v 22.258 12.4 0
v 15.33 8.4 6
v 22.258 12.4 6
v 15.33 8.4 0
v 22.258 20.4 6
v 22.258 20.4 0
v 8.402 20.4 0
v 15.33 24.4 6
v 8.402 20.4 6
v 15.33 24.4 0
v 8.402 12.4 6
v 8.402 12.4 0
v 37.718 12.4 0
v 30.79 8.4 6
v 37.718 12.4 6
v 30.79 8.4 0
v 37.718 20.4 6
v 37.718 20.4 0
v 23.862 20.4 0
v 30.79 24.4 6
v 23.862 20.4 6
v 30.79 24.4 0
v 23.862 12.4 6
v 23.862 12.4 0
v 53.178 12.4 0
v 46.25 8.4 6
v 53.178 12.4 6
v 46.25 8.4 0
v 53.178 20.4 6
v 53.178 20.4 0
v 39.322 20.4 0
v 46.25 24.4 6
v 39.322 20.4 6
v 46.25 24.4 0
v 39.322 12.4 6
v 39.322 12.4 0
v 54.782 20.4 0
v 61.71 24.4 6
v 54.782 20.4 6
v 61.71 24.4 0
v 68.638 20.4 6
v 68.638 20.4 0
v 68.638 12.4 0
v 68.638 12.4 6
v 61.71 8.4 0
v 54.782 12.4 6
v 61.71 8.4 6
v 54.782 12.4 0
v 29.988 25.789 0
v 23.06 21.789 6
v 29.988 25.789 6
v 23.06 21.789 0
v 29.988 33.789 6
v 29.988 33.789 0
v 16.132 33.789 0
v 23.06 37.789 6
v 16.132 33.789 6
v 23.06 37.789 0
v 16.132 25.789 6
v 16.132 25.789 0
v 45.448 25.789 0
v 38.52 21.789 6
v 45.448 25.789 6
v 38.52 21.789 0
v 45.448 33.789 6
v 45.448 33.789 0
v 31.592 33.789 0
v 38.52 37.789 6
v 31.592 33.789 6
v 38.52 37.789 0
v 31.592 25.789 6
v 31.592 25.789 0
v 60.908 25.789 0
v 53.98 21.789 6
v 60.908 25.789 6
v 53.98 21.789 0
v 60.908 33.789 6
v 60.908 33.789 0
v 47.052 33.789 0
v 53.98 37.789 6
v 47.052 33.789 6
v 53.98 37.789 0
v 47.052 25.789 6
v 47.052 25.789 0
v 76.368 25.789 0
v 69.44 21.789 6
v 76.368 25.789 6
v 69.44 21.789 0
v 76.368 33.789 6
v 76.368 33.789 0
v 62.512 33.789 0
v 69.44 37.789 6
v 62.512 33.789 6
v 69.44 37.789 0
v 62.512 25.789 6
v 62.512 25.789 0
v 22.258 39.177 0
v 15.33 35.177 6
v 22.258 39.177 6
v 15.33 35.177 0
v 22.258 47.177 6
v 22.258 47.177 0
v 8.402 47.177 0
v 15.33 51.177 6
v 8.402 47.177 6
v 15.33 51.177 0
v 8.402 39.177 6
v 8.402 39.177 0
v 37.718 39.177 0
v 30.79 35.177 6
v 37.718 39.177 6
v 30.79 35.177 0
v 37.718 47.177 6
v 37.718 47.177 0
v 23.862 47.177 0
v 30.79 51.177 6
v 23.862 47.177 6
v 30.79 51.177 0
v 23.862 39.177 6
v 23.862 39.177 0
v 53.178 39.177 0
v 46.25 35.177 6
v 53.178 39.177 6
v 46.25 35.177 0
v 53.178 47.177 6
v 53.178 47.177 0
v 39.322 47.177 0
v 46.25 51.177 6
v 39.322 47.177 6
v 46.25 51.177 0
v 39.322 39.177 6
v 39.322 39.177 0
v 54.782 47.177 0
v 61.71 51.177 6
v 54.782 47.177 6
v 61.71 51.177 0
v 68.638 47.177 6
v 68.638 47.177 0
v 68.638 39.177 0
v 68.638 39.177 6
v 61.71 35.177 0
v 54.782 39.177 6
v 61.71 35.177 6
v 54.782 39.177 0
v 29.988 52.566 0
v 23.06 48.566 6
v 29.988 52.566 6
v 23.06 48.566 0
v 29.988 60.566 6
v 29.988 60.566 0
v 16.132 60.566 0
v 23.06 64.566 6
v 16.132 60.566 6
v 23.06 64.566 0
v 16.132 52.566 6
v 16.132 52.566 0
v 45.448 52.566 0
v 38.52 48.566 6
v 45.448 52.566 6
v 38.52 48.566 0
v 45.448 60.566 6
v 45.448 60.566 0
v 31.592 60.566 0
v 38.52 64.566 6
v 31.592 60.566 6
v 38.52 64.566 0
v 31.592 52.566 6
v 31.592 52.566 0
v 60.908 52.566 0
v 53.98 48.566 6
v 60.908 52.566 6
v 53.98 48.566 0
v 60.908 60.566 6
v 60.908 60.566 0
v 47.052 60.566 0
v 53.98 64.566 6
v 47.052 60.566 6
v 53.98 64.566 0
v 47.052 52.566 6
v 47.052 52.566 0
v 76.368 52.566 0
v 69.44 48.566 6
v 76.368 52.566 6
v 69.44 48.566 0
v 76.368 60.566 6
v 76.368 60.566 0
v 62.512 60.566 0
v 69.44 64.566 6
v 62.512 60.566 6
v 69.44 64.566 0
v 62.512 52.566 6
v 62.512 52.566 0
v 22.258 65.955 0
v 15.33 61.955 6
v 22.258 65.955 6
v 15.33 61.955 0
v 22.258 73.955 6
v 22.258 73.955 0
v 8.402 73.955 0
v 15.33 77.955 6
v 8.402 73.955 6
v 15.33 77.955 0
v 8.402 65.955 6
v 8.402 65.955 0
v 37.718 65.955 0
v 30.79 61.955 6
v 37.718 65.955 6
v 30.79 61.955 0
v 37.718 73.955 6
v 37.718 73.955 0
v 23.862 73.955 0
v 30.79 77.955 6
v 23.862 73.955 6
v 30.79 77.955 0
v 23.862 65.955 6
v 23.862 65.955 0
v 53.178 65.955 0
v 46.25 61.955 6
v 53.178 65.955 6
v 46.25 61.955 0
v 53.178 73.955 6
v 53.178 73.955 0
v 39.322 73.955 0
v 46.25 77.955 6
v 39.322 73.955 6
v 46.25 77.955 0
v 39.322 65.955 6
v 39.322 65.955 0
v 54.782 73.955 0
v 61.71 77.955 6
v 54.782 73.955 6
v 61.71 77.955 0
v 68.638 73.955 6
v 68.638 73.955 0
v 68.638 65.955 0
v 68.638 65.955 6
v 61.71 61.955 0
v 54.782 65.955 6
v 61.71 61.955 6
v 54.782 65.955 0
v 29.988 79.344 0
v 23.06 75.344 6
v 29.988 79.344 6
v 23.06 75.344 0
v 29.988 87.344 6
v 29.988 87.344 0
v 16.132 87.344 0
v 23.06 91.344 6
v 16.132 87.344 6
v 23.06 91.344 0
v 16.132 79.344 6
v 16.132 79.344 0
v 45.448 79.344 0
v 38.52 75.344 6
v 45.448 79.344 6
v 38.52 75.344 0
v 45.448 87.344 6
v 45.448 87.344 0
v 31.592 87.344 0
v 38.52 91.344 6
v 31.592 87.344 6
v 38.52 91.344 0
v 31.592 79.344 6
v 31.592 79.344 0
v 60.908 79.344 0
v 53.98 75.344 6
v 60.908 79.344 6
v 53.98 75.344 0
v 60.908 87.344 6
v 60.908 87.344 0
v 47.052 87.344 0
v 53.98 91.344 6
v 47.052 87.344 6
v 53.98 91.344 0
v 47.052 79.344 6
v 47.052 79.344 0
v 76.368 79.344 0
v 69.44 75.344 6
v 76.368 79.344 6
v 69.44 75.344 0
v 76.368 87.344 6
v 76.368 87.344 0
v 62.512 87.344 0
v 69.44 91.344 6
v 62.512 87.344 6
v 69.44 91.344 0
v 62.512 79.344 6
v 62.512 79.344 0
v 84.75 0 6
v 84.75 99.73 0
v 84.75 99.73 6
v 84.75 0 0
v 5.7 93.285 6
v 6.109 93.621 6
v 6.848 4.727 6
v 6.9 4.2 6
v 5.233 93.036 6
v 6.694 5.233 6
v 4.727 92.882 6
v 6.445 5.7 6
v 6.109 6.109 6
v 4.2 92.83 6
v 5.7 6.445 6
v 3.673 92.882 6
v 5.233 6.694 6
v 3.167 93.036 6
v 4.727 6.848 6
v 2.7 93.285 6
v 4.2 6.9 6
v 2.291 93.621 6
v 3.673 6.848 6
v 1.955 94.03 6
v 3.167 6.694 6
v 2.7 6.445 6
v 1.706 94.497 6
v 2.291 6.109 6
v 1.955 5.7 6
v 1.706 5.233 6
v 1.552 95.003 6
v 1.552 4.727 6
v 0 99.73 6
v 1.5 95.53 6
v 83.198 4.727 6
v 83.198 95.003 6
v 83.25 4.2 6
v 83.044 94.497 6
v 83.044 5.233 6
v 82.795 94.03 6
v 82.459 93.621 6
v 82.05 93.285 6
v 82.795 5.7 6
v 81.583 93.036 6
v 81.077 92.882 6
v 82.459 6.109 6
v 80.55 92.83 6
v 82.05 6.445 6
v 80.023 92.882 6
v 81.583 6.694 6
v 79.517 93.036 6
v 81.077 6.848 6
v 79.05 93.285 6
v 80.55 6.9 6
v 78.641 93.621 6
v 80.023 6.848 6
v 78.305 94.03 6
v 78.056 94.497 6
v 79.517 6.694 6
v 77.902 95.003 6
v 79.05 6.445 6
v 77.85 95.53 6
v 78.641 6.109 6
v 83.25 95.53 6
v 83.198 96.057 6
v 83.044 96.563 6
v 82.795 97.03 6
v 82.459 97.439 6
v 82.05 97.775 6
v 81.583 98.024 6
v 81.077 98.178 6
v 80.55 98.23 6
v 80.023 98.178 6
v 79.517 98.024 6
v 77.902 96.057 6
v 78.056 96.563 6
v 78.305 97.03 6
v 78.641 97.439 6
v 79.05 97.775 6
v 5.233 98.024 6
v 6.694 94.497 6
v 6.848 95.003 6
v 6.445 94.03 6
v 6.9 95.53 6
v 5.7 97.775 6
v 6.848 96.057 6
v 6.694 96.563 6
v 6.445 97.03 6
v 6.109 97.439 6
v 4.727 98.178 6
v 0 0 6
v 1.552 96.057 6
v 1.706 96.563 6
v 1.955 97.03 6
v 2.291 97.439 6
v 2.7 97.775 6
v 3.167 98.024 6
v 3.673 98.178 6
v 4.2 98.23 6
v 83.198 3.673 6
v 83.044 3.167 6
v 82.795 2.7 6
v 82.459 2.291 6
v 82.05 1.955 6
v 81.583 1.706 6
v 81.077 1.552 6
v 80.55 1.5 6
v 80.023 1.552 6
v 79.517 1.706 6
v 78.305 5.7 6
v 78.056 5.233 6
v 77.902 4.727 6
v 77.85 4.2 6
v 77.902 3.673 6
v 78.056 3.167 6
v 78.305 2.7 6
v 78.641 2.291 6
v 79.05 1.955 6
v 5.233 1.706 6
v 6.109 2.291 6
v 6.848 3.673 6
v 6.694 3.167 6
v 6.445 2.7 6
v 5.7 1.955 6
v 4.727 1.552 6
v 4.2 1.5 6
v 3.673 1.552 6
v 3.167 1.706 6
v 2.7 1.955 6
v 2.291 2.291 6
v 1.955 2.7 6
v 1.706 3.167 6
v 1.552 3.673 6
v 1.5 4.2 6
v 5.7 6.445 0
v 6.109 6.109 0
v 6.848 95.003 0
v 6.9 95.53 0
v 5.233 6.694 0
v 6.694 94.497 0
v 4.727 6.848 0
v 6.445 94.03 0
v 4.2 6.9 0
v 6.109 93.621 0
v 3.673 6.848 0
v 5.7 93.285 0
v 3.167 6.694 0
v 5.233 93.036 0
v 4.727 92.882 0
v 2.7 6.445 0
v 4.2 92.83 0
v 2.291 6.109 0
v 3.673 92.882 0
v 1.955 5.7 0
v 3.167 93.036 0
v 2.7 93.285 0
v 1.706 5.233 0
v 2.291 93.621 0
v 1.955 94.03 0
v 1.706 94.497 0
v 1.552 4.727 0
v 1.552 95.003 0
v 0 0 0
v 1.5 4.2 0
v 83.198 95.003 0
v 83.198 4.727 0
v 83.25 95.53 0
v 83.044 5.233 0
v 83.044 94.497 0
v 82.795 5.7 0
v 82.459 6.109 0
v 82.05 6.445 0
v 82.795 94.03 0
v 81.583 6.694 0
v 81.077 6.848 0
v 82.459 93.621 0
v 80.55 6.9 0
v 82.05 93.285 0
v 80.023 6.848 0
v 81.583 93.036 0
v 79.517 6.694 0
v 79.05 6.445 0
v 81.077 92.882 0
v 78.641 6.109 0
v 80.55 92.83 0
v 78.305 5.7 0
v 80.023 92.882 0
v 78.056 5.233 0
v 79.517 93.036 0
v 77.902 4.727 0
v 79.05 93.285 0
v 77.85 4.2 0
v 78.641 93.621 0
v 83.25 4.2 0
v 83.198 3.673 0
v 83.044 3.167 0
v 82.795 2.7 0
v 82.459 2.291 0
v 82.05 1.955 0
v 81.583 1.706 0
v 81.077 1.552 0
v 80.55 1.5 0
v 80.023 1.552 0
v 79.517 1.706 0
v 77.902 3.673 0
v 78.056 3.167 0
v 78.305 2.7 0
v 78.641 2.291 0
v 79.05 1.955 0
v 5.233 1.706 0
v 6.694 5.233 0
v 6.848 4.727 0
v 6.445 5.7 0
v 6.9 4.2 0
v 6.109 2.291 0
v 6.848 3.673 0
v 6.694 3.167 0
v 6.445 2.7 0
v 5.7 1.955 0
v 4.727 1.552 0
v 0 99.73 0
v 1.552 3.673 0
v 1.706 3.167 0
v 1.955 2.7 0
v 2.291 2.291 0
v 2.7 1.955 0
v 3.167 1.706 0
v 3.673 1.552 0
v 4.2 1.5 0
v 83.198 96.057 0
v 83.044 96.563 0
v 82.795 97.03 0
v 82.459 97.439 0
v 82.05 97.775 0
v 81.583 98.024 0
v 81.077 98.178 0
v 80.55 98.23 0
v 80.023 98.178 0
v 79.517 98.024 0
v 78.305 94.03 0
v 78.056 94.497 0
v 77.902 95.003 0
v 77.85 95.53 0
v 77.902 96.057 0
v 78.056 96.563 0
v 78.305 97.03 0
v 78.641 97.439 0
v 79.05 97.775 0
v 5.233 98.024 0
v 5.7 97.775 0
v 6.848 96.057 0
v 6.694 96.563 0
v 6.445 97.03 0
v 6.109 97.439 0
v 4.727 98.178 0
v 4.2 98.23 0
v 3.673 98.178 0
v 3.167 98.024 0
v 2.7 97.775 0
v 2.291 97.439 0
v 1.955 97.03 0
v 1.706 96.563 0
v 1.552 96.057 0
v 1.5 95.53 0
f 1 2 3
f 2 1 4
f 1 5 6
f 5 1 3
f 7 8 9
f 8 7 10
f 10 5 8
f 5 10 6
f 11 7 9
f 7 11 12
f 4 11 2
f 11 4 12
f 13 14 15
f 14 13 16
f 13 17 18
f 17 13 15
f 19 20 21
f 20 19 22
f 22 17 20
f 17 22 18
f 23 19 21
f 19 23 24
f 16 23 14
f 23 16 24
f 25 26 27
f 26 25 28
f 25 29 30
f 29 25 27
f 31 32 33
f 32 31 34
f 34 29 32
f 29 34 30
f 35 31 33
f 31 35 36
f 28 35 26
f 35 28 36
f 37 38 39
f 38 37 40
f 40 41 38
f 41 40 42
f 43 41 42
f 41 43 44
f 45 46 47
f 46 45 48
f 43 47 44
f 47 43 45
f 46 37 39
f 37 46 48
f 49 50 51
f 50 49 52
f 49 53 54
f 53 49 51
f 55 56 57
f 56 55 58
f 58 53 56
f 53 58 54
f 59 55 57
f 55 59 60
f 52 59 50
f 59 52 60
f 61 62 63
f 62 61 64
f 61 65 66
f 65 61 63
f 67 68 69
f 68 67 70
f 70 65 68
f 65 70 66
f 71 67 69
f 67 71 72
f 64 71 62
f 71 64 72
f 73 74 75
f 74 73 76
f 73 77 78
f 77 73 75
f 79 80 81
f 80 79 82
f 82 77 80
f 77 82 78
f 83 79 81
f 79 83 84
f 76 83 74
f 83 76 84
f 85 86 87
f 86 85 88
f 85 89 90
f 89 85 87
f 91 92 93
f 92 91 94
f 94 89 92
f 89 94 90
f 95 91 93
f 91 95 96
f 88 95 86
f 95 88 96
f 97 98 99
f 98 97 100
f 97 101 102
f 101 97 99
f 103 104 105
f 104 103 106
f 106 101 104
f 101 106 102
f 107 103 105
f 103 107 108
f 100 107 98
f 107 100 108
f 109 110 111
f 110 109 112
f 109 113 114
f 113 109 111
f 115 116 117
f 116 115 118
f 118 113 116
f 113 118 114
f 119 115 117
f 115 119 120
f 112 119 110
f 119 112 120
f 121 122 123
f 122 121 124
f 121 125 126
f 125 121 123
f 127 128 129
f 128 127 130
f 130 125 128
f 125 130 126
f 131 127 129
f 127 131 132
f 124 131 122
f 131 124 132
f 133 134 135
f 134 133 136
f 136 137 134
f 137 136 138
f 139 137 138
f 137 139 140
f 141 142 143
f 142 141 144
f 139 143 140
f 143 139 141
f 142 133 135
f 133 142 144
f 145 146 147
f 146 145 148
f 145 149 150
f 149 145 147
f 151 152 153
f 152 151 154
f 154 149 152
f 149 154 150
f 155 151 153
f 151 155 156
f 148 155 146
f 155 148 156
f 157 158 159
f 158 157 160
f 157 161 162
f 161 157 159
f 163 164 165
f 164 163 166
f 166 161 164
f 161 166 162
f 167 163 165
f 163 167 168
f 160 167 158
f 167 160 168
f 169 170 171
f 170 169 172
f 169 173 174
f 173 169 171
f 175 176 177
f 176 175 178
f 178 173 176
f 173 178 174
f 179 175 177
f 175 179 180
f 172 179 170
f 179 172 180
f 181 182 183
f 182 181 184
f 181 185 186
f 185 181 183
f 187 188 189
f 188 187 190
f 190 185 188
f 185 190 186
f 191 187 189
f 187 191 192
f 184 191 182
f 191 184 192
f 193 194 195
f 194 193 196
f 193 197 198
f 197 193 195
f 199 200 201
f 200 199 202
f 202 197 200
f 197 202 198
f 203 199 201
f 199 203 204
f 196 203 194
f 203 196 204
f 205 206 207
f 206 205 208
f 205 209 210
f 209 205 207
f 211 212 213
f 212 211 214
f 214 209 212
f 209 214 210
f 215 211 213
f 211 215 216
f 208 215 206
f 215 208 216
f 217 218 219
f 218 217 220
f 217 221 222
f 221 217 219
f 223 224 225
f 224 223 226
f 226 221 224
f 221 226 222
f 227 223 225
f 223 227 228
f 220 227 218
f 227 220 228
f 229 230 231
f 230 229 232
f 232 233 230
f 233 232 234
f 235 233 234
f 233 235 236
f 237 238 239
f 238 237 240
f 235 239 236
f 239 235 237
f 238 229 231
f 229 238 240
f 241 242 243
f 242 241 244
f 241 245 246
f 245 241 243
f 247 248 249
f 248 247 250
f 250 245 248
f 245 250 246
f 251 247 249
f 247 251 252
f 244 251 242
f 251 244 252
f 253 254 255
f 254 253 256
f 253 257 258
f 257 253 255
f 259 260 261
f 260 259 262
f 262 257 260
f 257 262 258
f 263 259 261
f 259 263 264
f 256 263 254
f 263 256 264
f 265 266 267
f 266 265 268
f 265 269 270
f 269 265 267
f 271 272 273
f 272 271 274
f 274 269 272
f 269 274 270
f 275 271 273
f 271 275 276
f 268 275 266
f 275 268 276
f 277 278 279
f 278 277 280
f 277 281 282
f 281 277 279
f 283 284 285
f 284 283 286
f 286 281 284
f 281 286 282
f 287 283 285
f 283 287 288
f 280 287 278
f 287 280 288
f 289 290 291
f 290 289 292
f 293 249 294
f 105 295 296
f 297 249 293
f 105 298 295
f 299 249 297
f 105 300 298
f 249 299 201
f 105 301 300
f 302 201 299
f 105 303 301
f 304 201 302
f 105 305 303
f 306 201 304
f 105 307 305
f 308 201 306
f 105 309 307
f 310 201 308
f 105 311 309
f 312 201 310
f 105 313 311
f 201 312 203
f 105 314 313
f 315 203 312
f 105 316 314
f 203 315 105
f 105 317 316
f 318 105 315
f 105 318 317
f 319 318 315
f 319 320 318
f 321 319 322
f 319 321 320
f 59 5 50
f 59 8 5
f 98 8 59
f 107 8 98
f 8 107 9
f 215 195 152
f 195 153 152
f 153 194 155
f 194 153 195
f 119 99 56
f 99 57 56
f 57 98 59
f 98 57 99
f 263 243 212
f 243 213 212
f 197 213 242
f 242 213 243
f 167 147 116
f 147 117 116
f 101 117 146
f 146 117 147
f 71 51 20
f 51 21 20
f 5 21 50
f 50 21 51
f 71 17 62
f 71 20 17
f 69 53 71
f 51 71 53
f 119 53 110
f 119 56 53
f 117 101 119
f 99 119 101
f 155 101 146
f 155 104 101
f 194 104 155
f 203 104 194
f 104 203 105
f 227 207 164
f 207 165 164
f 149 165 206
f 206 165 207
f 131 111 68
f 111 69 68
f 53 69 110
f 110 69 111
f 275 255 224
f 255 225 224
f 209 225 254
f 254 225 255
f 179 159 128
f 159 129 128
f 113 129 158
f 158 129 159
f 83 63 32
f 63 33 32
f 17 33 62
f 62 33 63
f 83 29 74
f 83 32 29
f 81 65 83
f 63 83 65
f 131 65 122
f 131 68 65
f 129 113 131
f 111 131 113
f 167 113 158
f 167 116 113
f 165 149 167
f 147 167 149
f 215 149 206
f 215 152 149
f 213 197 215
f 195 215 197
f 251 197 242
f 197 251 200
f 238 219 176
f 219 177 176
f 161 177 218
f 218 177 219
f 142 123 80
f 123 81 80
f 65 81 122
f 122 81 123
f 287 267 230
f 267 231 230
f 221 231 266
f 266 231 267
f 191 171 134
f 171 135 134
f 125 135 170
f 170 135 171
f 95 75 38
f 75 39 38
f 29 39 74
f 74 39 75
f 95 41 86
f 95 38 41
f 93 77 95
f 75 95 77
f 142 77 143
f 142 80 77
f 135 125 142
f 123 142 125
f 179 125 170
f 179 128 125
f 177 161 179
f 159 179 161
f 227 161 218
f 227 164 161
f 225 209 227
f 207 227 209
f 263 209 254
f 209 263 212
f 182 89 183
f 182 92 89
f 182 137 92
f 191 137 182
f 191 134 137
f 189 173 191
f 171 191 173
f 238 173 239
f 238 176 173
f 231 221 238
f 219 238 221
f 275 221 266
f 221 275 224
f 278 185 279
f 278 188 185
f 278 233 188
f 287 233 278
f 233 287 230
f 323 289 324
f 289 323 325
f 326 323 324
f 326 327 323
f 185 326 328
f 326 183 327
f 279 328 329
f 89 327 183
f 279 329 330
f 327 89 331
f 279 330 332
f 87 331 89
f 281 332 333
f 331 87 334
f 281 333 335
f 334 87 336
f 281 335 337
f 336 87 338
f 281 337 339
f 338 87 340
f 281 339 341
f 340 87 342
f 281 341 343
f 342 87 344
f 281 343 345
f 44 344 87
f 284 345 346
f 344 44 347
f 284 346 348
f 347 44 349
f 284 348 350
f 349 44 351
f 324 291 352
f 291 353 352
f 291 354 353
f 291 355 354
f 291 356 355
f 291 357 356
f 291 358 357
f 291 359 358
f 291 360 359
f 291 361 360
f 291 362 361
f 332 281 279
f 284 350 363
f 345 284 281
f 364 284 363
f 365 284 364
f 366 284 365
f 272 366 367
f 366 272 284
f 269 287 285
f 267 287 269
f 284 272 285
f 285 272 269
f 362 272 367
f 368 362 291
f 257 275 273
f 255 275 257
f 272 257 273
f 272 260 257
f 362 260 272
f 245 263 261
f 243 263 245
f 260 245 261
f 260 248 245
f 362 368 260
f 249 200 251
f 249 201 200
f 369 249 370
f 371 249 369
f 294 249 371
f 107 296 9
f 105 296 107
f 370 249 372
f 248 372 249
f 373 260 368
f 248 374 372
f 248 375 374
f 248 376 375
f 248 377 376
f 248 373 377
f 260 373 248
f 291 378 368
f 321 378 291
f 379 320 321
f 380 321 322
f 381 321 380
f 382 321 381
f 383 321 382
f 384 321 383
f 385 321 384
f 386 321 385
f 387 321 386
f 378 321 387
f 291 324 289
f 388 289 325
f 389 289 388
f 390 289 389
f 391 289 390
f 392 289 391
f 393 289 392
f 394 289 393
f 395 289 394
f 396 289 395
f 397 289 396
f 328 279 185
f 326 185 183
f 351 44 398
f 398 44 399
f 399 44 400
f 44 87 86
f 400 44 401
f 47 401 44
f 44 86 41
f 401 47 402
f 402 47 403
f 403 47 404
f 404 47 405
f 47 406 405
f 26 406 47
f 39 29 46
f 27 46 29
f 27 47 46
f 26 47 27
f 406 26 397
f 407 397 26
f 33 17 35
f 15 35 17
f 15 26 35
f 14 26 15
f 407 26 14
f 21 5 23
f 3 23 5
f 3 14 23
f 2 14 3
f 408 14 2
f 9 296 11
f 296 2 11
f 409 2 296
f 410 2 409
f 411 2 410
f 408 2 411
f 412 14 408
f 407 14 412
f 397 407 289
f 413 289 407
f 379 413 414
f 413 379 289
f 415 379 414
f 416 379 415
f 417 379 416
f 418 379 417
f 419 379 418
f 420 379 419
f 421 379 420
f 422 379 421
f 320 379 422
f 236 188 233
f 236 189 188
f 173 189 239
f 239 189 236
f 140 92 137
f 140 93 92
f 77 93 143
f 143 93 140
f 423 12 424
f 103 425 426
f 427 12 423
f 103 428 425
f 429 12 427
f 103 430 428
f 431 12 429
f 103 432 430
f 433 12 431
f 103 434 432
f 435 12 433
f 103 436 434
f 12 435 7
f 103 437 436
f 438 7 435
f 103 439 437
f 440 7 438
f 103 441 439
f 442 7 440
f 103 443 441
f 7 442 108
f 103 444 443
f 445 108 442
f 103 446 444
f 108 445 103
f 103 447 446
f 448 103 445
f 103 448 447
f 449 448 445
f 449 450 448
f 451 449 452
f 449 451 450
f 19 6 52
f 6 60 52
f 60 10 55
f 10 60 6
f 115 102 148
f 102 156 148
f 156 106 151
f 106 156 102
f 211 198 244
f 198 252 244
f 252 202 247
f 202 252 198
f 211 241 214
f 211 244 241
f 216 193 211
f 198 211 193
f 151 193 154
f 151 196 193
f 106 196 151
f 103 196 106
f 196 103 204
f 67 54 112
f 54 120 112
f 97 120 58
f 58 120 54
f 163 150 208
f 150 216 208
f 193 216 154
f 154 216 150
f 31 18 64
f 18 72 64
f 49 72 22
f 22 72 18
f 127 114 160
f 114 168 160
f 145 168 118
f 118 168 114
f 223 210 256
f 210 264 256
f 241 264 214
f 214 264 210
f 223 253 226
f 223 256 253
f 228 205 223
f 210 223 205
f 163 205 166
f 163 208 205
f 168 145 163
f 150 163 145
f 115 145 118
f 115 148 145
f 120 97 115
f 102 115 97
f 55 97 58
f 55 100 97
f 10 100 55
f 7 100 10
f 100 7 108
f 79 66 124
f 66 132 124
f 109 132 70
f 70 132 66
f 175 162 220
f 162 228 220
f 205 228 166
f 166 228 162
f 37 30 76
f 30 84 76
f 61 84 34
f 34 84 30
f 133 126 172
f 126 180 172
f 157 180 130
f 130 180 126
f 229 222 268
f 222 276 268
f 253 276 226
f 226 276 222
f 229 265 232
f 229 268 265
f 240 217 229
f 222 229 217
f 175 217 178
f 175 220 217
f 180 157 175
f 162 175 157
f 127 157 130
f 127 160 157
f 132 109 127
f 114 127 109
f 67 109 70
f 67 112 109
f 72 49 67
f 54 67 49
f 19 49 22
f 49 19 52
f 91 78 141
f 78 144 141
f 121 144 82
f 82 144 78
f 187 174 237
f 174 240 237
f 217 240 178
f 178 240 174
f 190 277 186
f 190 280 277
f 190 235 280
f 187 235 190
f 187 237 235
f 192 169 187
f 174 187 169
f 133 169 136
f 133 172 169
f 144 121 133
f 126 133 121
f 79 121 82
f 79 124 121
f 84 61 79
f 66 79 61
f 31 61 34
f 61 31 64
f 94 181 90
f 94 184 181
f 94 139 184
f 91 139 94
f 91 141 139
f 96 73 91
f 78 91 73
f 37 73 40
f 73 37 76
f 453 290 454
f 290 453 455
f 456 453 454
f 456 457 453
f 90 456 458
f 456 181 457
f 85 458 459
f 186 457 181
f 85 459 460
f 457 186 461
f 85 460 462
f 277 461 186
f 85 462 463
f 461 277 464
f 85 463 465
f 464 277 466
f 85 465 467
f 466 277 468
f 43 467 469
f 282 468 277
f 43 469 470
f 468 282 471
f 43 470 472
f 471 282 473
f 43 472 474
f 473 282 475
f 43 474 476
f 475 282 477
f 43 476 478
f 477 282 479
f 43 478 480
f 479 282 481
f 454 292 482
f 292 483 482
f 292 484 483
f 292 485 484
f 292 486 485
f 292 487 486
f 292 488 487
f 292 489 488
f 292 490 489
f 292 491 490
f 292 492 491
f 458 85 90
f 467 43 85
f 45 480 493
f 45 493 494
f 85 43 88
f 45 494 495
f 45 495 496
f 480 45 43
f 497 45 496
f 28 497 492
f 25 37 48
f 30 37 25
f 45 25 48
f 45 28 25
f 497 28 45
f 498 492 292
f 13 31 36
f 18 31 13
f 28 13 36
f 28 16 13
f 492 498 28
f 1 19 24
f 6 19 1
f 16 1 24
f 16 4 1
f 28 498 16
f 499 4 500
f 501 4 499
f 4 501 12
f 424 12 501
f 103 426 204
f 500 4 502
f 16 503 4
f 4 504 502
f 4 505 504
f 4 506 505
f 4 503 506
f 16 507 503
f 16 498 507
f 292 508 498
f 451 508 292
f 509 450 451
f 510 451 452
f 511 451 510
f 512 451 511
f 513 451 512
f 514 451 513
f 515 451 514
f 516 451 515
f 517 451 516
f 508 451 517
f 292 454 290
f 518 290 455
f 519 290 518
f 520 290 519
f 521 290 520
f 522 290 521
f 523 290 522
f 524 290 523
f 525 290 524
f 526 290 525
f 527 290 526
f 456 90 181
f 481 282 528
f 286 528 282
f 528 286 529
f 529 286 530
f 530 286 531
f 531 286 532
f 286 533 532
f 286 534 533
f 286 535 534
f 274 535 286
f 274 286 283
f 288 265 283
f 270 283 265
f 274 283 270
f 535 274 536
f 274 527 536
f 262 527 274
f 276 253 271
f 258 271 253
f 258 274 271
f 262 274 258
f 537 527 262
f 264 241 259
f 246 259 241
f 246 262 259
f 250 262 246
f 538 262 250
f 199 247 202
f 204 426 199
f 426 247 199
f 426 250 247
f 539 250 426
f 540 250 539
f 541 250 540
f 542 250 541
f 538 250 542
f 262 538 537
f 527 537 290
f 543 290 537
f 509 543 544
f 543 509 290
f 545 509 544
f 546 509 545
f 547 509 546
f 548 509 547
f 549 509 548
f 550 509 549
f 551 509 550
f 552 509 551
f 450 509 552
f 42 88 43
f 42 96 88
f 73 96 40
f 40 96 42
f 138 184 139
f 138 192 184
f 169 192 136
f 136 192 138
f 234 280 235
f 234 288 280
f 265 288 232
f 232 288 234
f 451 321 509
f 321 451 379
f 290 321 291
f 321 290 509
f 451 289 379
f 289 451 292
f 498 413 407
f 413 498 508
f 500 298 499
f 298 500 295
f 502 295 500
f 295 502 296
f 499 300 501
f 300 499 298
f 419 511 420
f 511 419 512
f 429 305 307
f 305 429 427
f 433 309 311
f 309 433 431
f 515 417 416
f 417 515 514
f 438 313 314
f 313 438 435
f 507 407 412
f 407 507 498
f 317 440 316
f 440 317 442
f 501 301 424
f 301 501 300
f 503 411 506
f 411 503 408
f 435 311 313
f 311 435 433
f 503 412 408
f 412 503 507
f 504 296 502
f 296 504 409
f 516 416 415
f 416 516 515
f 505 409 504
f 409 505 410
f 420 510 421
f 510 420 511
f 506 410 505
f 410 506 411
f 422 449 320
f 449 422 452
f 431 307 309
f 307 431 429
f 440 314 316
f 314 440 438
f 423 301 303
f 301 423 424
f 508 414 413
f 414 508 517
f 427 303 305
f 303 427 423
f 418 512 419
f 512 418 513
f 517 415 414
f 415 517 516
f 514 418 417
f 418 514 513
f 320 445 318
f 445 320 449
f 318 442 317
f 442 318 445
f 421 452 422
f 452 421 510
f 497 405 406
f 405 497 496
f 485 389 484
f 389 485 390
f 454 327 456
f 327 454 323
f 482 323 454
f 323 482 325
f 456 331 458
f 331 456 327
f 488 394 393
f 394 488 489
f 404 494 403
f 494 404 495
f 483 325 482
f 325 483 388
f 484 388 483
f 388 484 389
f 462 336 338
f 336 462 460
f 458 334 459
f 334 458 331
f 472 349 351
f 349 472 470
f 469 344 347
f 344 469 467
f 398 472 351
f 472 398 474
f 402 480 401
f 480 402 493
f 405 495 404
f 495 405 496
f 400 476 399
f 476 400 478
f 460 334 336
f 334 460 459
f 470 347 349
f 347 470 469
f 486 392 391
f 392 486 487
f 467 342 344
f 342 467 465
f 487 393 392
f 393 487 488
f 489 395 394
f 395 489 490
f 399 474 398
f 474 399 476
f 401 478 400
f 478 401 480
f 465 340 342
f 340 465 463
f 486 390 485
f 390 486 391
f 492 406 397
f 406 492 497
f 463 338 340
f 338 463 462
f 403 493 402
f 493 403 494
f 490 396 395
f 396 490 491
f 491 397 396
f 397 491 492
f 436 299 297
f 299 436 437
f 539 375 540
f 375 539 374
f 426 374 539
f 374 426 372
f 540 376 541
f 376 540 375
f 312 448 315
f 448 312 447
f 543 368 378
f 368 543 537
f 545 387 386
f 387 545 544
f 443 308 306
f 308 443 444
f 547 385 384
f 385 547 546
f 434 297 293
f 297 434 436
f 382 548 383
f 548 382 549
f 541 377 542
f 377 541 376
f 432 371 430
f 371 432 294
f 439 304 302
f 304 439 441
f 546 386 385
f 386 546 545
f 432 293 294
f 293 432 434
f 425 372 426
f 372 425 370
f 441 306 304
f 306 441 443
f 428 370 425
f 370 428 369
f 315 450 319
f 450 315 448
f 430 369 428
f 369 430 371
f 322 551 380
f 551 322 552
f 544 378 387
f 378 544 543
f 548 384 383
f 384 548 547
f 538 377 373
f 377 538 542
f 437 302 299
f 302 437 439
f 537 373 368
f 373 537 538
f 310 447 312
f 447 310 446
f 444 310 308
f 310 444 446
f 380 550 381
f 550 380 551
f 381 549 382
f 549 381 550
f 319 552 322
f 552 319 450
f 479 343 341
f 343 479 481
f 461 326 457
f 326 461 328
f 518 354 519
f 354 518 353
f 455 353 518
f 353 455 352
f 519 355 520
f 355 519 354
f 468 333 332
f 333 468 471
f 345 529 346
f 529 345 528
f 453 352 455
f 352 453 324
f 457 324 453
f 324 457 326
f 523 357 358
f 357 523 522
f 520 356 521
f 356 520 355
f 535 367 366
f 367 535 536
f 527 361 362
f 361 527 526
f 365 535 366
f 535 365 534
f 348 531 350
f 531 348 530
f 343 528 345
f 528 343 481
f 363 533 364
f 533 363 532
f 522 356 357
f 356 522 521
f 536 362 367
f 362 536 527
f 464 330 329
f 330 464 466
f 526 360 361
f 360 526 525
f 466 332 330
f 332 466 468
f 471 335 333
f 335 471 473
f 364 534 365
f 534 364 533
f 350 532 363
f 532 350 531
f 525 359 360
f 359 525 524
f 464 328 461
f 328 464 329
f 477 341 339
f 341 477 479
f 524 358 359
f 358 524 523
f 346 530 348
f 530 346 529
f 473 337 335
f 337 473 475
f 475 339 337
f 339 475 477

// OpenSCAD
$fn = 32;

// ----------------------------------------------------------------------
// Honeycomb panel: 84.75 x 99.73 mm, 24 cells of 16 mm
// ----------------------------------------------------------------------

// --- parameters (mm) ---
panel_w = 84.75;          // panel width
panel_d = 99.73;          // panel depth
thick = 6;                // panel thickness
cell_r = 8;               // hex cell circumradius
pitch = 15.46;            // hex cell pitch (centre to centre)
web = 1.6;                // web between the cells
columns = 4;              // columns of cells
rows = 6;                 // rows of cells
cell_count = 24;          // total cells
shift_x = 15.33;          // first cell offset in x
shift_y = 16.4;           // first cell offset in y
mount_d = 5.4;            // corner mounting holes
hole_off = 4.2;           // mounting hole offset from the corners

difference() {
  union() {
    cube([panel_w, panel_d, thick]);
  }
  /* hexagonal cells, point-up, cut right through the plate */
  for (row = [0 : rows - 1]) {
    for (col = [0 : columns - 1]) {
      translate([shift_x + col * pitch + (row % 2) * pitch / 2, shift_y + row * pitch * 0.866025, -2.5]) rotate([0, 0, 30]) cylinder(h = thick + 5, d = 2 * cell_r, $fn = 6);
    }
  }
  /* corner mounting holes, clear of the outer cell web */
  translate([4.2, 4.2, -2.5]) cylinder(h = thick + 5, d = mount_d);
  translate([80.55, 4.2, -2.5]) cylinder(h = thick + 5, d = mount_d);
  translate([4.2, 95.53, -2.5]) cylinder(h = thick + 5, d = mount_d);
  translate([80.55, 95.53, -2.5]) cylinder(h = thick + 5, d = mount_d);
}
